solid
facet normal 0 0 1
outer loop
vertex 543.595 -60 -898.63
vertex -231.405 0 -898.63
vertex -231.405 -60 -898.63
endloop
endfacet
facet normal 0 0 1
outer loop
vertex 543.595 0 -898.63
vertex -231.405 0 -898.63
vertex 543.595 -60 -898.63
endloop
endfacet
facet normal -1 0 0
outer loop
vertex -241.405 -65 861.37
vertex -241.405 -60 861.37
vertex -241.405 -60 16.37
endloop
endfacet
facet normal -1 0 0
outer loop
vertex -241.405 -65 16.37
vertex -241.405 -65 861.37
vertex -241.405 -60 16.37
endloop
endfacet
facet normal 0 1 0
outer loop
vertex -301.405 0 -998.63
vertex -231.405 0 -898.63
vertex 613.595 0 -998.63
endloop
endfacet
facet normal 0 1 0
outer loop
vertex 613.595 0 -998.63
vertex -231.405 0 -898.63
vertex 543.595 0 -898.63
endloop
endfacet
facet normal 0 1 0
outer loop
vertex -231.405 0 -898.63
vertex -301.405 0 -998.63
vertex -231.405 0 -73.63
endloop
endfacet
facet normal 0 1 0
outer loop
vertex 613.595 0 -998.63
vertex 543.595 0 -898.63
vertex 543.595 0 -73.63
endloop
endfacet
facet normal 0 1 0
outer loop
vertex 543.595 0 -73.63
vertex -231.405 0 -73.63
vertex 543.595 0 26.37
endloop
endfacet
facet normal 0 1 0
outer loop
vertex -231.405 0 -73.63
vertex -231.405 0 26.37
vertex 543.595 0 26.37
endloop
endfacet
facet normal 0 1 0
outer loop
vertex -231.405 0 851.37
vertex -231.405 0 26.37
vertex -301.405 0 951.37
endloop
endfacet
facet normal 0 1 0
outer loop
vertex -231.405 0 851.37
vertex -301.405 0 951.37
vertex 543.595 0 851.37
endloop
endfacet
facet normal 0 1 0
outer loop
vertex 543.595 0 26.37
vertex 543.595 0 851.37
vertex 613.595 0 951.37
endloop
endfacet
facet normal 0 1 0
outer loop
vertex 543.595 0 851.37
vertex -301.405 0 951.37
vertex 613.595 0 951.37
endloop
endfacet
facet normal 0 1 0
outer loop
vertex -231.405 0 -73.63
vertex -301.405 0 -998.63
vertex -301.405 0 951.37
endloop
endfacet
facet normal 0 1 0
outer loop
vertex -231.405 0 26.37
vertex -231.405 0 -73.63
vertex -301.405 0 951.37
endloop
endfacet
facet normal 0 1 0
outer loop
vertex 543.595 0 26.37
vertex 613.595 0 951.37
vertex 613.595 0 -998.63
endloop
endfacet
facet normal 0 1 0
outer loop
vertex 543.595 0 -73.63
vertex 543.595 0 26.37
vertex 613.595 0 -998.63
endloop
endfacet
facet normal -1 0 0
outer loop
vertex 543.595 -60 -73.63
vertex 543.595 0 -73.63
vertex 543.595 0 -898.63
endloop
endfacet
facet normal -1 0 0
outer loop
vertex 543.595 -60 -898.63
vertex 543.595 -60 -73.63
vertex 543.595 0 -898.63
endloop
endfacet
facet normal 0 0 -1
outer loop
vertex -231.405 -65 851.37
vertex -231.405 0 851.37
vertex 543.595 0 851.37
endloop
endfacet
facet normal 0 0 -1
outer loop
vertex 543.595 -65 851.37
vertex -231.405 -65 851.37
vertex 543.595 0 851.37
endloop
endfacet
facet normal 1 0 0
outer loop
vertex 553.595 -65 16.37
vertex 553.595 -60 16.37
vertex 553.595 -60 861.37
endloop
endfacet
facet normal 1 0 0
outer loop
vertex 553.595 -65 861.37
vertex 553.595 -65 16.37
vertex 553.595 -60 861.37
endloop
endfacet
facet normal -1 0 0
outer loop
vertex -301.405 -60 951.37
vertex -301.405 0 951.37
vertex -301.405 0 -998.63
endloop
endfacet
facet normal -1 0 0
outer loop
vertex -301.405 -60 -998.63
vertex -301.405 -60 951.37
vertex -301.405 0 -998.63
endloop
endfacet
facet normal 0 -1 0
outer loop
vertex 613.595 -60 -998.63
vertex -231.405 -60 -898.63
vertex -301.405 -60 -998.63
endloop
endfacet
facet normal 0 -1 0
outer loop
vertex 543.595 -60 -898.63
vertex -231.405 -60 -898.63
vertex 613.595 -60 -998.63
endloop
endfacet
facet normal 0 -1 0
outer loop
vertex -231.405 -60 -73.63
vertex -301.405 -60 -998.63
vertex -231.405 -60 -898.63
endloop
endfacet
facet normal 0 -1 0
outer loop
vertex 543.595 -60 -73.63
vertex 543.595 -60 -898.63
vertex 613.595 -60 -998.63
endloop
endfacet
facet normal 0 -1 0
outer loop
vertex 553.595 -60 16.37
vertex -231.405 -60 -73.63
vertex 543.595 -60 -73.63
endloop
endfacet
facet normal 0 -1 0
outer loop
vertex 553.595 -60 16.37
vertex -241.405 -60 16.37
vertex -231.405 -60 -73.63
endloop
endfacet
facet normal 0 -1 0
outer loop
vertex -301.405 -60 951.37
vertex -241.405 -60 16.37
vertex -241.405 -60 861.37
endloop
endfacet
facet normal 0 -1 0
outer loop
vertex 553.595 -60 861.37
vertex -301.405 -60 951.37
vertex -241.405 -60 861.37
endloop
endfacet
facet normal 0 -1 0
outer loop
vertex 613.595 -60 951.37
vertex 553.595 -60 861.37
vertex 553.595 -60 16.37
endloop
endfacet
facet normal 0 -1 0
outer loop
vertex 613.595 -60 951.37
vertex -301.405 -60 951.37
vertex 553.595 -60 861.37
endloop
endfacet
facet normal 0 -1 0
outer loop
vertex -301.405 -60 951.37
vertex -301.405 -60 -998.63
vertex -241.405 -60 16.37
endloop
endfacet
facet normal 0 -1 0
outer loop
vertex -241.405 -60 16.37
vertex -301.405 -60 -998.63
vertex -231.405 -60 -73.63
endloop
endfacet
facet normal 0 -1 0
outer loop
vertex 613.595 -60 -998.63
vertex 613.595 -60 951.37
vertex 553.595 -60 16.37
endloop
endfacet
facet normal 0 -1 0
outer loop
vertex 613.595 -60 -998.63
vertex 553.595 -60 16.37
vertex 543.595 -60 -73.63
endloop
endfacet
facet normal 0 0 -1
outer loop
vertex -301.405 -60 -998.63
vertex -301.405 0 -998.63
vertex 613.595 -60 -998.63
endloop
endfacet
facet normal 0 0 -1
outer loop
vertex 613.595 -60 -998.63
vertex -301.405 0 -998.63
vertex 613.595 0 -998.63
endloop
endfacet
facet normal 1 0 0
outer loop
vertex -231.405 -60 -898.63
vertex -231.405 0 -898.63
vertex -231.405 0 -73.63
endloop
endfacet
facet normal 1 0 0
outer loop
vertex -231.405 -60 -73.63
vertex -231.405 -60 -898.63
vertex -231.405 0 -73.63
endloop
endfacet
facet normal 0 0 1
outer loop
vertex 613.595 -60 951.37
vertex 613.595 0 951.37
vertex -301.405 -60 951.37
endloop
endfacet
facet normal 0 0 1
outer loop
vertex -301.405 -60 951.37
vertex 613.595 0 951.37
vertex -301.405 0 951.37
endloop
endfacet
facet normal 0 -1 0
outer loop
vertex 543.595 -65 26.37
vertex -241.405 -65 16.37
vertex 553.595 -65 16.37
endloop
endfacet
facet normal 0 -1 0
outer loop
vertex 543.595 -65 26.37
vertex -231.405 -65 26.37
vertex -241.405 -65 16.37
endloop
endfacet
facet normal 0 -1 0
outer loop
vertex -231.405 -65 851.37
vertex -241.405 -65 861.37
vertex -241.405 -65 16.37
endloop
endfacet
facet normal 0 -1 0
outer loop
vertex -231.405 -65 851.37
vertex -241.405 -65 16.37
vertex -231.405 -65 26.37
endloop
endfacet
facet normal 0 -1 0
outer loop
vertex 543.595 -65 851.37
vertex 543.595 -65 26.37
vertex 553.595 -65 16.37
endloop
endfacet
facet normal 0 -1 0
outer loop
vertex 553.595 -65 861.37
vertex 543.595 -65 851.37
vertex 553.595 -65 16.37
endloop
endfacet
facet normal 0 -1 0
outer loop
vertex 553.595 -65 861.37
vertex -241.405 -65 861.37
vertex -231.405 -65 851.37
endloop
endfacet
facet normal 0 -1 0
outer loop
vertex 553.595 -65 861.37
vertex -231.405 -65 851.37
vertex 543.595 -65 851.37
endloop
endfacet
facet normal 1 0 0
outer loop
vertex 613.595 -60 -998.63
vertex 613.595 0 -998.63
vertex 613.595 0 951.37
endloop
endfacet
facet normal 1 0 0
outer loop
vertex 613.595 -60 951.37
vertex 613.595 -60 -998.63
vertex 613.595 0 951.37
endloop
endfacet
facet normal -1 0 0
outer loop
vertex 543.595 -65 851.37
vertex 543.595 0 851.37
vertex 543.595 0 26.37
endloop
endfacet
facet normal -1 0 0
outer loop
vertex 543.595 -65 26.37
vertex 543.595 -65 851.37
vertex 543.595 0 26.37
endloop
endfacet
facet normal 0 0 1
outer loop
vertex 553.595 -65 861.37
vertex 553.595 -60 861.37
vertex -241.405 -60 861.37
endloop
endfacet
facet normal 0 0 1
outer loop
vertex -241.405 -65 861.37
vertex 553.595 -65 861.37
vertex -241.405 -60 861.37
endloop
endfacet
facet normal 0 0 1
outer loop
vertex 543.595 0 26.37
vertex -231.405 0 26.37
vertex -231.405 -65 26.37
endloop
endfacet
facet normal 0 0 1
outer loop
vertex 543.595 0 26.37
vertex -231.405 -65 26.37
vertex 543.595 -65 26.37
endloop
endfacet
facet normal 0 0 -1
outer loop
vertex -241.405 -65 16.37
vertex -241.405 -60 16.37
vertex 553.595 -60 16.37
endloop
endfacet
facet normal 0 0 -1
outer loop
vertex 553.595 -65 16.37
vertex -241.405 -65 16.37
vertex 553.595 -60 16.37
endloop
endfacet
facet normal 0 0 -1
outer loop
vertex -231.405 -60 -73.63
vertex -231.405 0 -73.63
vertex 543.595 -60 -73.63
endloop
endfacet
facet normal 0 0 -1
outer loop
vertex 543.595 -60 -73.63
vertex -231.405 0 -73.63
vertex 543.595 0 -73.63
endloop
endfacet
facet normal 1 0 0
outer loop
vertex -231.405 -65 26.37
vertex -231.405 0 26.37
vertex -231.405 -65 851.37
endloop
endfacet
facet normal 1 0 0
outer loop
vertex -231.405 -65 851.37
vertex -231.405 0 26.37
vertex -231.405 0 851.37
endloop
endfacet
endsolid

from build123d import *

# Parameters (mm, degrees)
F0_W     = 775
F0_H     = 100
F1_DEPTH = 60
F2_W     = 775
F2_H     = 10
F3_DEPTH = 65


with BuildPart() as f1:
    # F0 (on Front) → F1 (new body)
    with BuildSketch(Plane.XZ):
        Polygon((-231.40455, 951.369763), (-301.40455, 951.369763), (-301.40455, -998.630237), (-231.40455, -998.630237), (-231.40455, -898.630237), (-231.40455, -73.630237), (-231.40455, 26.369763), (-231.40455, 851.369763), align=None)
        with Locations((156.09545, 901.369763)):
            Rectangle(F0_W, F0_H)
        Polygon((613.59545, 951.369763), (543.59545, 951.369763), (543.59545, 851.369763), (543.59545, 26.369763), (543.59545, -73.630237), (543.59545, -898.630237), (543.59545, -998.630237), (613.59545, -998.630237), align=None)
        with Locations((156.09545, -23.630237)):
            Rectangle(F0_W, F0_H)
        with Locations((156.09545, -948.630237)):
            Rectangle(F0_W, F0_H)
    extrude(amount=F1_DEPTH)

    # F2 (on Front) → F3 (join)
    with BuildSketch(Plane.XZ):
        Polygon((-241.40455, 16.369763), (-231.40455, 16.369763), (-231.40455, 26.369763), (-231.40455, 851.369763), (-231.40455, 861.369763), (-241.40455, 861.369763), align=None)
        with Locations((156.09545, 21.369763)):
            Rectangle(F2_W, F2_H)
        Polygon((543.59545, 26.369763), (543.59545, 16.369763), (553.59545, 16.369763), (553.59545, 861.369763), (543.59545, 861.369763), (543.59545, 851.369763), align=None)
        with Locations((156.09545, 856.369763)):
            Rectangle(F2_W, F2_H)
    extrude(amount=F3_DEPTH)


solid = f1.part
